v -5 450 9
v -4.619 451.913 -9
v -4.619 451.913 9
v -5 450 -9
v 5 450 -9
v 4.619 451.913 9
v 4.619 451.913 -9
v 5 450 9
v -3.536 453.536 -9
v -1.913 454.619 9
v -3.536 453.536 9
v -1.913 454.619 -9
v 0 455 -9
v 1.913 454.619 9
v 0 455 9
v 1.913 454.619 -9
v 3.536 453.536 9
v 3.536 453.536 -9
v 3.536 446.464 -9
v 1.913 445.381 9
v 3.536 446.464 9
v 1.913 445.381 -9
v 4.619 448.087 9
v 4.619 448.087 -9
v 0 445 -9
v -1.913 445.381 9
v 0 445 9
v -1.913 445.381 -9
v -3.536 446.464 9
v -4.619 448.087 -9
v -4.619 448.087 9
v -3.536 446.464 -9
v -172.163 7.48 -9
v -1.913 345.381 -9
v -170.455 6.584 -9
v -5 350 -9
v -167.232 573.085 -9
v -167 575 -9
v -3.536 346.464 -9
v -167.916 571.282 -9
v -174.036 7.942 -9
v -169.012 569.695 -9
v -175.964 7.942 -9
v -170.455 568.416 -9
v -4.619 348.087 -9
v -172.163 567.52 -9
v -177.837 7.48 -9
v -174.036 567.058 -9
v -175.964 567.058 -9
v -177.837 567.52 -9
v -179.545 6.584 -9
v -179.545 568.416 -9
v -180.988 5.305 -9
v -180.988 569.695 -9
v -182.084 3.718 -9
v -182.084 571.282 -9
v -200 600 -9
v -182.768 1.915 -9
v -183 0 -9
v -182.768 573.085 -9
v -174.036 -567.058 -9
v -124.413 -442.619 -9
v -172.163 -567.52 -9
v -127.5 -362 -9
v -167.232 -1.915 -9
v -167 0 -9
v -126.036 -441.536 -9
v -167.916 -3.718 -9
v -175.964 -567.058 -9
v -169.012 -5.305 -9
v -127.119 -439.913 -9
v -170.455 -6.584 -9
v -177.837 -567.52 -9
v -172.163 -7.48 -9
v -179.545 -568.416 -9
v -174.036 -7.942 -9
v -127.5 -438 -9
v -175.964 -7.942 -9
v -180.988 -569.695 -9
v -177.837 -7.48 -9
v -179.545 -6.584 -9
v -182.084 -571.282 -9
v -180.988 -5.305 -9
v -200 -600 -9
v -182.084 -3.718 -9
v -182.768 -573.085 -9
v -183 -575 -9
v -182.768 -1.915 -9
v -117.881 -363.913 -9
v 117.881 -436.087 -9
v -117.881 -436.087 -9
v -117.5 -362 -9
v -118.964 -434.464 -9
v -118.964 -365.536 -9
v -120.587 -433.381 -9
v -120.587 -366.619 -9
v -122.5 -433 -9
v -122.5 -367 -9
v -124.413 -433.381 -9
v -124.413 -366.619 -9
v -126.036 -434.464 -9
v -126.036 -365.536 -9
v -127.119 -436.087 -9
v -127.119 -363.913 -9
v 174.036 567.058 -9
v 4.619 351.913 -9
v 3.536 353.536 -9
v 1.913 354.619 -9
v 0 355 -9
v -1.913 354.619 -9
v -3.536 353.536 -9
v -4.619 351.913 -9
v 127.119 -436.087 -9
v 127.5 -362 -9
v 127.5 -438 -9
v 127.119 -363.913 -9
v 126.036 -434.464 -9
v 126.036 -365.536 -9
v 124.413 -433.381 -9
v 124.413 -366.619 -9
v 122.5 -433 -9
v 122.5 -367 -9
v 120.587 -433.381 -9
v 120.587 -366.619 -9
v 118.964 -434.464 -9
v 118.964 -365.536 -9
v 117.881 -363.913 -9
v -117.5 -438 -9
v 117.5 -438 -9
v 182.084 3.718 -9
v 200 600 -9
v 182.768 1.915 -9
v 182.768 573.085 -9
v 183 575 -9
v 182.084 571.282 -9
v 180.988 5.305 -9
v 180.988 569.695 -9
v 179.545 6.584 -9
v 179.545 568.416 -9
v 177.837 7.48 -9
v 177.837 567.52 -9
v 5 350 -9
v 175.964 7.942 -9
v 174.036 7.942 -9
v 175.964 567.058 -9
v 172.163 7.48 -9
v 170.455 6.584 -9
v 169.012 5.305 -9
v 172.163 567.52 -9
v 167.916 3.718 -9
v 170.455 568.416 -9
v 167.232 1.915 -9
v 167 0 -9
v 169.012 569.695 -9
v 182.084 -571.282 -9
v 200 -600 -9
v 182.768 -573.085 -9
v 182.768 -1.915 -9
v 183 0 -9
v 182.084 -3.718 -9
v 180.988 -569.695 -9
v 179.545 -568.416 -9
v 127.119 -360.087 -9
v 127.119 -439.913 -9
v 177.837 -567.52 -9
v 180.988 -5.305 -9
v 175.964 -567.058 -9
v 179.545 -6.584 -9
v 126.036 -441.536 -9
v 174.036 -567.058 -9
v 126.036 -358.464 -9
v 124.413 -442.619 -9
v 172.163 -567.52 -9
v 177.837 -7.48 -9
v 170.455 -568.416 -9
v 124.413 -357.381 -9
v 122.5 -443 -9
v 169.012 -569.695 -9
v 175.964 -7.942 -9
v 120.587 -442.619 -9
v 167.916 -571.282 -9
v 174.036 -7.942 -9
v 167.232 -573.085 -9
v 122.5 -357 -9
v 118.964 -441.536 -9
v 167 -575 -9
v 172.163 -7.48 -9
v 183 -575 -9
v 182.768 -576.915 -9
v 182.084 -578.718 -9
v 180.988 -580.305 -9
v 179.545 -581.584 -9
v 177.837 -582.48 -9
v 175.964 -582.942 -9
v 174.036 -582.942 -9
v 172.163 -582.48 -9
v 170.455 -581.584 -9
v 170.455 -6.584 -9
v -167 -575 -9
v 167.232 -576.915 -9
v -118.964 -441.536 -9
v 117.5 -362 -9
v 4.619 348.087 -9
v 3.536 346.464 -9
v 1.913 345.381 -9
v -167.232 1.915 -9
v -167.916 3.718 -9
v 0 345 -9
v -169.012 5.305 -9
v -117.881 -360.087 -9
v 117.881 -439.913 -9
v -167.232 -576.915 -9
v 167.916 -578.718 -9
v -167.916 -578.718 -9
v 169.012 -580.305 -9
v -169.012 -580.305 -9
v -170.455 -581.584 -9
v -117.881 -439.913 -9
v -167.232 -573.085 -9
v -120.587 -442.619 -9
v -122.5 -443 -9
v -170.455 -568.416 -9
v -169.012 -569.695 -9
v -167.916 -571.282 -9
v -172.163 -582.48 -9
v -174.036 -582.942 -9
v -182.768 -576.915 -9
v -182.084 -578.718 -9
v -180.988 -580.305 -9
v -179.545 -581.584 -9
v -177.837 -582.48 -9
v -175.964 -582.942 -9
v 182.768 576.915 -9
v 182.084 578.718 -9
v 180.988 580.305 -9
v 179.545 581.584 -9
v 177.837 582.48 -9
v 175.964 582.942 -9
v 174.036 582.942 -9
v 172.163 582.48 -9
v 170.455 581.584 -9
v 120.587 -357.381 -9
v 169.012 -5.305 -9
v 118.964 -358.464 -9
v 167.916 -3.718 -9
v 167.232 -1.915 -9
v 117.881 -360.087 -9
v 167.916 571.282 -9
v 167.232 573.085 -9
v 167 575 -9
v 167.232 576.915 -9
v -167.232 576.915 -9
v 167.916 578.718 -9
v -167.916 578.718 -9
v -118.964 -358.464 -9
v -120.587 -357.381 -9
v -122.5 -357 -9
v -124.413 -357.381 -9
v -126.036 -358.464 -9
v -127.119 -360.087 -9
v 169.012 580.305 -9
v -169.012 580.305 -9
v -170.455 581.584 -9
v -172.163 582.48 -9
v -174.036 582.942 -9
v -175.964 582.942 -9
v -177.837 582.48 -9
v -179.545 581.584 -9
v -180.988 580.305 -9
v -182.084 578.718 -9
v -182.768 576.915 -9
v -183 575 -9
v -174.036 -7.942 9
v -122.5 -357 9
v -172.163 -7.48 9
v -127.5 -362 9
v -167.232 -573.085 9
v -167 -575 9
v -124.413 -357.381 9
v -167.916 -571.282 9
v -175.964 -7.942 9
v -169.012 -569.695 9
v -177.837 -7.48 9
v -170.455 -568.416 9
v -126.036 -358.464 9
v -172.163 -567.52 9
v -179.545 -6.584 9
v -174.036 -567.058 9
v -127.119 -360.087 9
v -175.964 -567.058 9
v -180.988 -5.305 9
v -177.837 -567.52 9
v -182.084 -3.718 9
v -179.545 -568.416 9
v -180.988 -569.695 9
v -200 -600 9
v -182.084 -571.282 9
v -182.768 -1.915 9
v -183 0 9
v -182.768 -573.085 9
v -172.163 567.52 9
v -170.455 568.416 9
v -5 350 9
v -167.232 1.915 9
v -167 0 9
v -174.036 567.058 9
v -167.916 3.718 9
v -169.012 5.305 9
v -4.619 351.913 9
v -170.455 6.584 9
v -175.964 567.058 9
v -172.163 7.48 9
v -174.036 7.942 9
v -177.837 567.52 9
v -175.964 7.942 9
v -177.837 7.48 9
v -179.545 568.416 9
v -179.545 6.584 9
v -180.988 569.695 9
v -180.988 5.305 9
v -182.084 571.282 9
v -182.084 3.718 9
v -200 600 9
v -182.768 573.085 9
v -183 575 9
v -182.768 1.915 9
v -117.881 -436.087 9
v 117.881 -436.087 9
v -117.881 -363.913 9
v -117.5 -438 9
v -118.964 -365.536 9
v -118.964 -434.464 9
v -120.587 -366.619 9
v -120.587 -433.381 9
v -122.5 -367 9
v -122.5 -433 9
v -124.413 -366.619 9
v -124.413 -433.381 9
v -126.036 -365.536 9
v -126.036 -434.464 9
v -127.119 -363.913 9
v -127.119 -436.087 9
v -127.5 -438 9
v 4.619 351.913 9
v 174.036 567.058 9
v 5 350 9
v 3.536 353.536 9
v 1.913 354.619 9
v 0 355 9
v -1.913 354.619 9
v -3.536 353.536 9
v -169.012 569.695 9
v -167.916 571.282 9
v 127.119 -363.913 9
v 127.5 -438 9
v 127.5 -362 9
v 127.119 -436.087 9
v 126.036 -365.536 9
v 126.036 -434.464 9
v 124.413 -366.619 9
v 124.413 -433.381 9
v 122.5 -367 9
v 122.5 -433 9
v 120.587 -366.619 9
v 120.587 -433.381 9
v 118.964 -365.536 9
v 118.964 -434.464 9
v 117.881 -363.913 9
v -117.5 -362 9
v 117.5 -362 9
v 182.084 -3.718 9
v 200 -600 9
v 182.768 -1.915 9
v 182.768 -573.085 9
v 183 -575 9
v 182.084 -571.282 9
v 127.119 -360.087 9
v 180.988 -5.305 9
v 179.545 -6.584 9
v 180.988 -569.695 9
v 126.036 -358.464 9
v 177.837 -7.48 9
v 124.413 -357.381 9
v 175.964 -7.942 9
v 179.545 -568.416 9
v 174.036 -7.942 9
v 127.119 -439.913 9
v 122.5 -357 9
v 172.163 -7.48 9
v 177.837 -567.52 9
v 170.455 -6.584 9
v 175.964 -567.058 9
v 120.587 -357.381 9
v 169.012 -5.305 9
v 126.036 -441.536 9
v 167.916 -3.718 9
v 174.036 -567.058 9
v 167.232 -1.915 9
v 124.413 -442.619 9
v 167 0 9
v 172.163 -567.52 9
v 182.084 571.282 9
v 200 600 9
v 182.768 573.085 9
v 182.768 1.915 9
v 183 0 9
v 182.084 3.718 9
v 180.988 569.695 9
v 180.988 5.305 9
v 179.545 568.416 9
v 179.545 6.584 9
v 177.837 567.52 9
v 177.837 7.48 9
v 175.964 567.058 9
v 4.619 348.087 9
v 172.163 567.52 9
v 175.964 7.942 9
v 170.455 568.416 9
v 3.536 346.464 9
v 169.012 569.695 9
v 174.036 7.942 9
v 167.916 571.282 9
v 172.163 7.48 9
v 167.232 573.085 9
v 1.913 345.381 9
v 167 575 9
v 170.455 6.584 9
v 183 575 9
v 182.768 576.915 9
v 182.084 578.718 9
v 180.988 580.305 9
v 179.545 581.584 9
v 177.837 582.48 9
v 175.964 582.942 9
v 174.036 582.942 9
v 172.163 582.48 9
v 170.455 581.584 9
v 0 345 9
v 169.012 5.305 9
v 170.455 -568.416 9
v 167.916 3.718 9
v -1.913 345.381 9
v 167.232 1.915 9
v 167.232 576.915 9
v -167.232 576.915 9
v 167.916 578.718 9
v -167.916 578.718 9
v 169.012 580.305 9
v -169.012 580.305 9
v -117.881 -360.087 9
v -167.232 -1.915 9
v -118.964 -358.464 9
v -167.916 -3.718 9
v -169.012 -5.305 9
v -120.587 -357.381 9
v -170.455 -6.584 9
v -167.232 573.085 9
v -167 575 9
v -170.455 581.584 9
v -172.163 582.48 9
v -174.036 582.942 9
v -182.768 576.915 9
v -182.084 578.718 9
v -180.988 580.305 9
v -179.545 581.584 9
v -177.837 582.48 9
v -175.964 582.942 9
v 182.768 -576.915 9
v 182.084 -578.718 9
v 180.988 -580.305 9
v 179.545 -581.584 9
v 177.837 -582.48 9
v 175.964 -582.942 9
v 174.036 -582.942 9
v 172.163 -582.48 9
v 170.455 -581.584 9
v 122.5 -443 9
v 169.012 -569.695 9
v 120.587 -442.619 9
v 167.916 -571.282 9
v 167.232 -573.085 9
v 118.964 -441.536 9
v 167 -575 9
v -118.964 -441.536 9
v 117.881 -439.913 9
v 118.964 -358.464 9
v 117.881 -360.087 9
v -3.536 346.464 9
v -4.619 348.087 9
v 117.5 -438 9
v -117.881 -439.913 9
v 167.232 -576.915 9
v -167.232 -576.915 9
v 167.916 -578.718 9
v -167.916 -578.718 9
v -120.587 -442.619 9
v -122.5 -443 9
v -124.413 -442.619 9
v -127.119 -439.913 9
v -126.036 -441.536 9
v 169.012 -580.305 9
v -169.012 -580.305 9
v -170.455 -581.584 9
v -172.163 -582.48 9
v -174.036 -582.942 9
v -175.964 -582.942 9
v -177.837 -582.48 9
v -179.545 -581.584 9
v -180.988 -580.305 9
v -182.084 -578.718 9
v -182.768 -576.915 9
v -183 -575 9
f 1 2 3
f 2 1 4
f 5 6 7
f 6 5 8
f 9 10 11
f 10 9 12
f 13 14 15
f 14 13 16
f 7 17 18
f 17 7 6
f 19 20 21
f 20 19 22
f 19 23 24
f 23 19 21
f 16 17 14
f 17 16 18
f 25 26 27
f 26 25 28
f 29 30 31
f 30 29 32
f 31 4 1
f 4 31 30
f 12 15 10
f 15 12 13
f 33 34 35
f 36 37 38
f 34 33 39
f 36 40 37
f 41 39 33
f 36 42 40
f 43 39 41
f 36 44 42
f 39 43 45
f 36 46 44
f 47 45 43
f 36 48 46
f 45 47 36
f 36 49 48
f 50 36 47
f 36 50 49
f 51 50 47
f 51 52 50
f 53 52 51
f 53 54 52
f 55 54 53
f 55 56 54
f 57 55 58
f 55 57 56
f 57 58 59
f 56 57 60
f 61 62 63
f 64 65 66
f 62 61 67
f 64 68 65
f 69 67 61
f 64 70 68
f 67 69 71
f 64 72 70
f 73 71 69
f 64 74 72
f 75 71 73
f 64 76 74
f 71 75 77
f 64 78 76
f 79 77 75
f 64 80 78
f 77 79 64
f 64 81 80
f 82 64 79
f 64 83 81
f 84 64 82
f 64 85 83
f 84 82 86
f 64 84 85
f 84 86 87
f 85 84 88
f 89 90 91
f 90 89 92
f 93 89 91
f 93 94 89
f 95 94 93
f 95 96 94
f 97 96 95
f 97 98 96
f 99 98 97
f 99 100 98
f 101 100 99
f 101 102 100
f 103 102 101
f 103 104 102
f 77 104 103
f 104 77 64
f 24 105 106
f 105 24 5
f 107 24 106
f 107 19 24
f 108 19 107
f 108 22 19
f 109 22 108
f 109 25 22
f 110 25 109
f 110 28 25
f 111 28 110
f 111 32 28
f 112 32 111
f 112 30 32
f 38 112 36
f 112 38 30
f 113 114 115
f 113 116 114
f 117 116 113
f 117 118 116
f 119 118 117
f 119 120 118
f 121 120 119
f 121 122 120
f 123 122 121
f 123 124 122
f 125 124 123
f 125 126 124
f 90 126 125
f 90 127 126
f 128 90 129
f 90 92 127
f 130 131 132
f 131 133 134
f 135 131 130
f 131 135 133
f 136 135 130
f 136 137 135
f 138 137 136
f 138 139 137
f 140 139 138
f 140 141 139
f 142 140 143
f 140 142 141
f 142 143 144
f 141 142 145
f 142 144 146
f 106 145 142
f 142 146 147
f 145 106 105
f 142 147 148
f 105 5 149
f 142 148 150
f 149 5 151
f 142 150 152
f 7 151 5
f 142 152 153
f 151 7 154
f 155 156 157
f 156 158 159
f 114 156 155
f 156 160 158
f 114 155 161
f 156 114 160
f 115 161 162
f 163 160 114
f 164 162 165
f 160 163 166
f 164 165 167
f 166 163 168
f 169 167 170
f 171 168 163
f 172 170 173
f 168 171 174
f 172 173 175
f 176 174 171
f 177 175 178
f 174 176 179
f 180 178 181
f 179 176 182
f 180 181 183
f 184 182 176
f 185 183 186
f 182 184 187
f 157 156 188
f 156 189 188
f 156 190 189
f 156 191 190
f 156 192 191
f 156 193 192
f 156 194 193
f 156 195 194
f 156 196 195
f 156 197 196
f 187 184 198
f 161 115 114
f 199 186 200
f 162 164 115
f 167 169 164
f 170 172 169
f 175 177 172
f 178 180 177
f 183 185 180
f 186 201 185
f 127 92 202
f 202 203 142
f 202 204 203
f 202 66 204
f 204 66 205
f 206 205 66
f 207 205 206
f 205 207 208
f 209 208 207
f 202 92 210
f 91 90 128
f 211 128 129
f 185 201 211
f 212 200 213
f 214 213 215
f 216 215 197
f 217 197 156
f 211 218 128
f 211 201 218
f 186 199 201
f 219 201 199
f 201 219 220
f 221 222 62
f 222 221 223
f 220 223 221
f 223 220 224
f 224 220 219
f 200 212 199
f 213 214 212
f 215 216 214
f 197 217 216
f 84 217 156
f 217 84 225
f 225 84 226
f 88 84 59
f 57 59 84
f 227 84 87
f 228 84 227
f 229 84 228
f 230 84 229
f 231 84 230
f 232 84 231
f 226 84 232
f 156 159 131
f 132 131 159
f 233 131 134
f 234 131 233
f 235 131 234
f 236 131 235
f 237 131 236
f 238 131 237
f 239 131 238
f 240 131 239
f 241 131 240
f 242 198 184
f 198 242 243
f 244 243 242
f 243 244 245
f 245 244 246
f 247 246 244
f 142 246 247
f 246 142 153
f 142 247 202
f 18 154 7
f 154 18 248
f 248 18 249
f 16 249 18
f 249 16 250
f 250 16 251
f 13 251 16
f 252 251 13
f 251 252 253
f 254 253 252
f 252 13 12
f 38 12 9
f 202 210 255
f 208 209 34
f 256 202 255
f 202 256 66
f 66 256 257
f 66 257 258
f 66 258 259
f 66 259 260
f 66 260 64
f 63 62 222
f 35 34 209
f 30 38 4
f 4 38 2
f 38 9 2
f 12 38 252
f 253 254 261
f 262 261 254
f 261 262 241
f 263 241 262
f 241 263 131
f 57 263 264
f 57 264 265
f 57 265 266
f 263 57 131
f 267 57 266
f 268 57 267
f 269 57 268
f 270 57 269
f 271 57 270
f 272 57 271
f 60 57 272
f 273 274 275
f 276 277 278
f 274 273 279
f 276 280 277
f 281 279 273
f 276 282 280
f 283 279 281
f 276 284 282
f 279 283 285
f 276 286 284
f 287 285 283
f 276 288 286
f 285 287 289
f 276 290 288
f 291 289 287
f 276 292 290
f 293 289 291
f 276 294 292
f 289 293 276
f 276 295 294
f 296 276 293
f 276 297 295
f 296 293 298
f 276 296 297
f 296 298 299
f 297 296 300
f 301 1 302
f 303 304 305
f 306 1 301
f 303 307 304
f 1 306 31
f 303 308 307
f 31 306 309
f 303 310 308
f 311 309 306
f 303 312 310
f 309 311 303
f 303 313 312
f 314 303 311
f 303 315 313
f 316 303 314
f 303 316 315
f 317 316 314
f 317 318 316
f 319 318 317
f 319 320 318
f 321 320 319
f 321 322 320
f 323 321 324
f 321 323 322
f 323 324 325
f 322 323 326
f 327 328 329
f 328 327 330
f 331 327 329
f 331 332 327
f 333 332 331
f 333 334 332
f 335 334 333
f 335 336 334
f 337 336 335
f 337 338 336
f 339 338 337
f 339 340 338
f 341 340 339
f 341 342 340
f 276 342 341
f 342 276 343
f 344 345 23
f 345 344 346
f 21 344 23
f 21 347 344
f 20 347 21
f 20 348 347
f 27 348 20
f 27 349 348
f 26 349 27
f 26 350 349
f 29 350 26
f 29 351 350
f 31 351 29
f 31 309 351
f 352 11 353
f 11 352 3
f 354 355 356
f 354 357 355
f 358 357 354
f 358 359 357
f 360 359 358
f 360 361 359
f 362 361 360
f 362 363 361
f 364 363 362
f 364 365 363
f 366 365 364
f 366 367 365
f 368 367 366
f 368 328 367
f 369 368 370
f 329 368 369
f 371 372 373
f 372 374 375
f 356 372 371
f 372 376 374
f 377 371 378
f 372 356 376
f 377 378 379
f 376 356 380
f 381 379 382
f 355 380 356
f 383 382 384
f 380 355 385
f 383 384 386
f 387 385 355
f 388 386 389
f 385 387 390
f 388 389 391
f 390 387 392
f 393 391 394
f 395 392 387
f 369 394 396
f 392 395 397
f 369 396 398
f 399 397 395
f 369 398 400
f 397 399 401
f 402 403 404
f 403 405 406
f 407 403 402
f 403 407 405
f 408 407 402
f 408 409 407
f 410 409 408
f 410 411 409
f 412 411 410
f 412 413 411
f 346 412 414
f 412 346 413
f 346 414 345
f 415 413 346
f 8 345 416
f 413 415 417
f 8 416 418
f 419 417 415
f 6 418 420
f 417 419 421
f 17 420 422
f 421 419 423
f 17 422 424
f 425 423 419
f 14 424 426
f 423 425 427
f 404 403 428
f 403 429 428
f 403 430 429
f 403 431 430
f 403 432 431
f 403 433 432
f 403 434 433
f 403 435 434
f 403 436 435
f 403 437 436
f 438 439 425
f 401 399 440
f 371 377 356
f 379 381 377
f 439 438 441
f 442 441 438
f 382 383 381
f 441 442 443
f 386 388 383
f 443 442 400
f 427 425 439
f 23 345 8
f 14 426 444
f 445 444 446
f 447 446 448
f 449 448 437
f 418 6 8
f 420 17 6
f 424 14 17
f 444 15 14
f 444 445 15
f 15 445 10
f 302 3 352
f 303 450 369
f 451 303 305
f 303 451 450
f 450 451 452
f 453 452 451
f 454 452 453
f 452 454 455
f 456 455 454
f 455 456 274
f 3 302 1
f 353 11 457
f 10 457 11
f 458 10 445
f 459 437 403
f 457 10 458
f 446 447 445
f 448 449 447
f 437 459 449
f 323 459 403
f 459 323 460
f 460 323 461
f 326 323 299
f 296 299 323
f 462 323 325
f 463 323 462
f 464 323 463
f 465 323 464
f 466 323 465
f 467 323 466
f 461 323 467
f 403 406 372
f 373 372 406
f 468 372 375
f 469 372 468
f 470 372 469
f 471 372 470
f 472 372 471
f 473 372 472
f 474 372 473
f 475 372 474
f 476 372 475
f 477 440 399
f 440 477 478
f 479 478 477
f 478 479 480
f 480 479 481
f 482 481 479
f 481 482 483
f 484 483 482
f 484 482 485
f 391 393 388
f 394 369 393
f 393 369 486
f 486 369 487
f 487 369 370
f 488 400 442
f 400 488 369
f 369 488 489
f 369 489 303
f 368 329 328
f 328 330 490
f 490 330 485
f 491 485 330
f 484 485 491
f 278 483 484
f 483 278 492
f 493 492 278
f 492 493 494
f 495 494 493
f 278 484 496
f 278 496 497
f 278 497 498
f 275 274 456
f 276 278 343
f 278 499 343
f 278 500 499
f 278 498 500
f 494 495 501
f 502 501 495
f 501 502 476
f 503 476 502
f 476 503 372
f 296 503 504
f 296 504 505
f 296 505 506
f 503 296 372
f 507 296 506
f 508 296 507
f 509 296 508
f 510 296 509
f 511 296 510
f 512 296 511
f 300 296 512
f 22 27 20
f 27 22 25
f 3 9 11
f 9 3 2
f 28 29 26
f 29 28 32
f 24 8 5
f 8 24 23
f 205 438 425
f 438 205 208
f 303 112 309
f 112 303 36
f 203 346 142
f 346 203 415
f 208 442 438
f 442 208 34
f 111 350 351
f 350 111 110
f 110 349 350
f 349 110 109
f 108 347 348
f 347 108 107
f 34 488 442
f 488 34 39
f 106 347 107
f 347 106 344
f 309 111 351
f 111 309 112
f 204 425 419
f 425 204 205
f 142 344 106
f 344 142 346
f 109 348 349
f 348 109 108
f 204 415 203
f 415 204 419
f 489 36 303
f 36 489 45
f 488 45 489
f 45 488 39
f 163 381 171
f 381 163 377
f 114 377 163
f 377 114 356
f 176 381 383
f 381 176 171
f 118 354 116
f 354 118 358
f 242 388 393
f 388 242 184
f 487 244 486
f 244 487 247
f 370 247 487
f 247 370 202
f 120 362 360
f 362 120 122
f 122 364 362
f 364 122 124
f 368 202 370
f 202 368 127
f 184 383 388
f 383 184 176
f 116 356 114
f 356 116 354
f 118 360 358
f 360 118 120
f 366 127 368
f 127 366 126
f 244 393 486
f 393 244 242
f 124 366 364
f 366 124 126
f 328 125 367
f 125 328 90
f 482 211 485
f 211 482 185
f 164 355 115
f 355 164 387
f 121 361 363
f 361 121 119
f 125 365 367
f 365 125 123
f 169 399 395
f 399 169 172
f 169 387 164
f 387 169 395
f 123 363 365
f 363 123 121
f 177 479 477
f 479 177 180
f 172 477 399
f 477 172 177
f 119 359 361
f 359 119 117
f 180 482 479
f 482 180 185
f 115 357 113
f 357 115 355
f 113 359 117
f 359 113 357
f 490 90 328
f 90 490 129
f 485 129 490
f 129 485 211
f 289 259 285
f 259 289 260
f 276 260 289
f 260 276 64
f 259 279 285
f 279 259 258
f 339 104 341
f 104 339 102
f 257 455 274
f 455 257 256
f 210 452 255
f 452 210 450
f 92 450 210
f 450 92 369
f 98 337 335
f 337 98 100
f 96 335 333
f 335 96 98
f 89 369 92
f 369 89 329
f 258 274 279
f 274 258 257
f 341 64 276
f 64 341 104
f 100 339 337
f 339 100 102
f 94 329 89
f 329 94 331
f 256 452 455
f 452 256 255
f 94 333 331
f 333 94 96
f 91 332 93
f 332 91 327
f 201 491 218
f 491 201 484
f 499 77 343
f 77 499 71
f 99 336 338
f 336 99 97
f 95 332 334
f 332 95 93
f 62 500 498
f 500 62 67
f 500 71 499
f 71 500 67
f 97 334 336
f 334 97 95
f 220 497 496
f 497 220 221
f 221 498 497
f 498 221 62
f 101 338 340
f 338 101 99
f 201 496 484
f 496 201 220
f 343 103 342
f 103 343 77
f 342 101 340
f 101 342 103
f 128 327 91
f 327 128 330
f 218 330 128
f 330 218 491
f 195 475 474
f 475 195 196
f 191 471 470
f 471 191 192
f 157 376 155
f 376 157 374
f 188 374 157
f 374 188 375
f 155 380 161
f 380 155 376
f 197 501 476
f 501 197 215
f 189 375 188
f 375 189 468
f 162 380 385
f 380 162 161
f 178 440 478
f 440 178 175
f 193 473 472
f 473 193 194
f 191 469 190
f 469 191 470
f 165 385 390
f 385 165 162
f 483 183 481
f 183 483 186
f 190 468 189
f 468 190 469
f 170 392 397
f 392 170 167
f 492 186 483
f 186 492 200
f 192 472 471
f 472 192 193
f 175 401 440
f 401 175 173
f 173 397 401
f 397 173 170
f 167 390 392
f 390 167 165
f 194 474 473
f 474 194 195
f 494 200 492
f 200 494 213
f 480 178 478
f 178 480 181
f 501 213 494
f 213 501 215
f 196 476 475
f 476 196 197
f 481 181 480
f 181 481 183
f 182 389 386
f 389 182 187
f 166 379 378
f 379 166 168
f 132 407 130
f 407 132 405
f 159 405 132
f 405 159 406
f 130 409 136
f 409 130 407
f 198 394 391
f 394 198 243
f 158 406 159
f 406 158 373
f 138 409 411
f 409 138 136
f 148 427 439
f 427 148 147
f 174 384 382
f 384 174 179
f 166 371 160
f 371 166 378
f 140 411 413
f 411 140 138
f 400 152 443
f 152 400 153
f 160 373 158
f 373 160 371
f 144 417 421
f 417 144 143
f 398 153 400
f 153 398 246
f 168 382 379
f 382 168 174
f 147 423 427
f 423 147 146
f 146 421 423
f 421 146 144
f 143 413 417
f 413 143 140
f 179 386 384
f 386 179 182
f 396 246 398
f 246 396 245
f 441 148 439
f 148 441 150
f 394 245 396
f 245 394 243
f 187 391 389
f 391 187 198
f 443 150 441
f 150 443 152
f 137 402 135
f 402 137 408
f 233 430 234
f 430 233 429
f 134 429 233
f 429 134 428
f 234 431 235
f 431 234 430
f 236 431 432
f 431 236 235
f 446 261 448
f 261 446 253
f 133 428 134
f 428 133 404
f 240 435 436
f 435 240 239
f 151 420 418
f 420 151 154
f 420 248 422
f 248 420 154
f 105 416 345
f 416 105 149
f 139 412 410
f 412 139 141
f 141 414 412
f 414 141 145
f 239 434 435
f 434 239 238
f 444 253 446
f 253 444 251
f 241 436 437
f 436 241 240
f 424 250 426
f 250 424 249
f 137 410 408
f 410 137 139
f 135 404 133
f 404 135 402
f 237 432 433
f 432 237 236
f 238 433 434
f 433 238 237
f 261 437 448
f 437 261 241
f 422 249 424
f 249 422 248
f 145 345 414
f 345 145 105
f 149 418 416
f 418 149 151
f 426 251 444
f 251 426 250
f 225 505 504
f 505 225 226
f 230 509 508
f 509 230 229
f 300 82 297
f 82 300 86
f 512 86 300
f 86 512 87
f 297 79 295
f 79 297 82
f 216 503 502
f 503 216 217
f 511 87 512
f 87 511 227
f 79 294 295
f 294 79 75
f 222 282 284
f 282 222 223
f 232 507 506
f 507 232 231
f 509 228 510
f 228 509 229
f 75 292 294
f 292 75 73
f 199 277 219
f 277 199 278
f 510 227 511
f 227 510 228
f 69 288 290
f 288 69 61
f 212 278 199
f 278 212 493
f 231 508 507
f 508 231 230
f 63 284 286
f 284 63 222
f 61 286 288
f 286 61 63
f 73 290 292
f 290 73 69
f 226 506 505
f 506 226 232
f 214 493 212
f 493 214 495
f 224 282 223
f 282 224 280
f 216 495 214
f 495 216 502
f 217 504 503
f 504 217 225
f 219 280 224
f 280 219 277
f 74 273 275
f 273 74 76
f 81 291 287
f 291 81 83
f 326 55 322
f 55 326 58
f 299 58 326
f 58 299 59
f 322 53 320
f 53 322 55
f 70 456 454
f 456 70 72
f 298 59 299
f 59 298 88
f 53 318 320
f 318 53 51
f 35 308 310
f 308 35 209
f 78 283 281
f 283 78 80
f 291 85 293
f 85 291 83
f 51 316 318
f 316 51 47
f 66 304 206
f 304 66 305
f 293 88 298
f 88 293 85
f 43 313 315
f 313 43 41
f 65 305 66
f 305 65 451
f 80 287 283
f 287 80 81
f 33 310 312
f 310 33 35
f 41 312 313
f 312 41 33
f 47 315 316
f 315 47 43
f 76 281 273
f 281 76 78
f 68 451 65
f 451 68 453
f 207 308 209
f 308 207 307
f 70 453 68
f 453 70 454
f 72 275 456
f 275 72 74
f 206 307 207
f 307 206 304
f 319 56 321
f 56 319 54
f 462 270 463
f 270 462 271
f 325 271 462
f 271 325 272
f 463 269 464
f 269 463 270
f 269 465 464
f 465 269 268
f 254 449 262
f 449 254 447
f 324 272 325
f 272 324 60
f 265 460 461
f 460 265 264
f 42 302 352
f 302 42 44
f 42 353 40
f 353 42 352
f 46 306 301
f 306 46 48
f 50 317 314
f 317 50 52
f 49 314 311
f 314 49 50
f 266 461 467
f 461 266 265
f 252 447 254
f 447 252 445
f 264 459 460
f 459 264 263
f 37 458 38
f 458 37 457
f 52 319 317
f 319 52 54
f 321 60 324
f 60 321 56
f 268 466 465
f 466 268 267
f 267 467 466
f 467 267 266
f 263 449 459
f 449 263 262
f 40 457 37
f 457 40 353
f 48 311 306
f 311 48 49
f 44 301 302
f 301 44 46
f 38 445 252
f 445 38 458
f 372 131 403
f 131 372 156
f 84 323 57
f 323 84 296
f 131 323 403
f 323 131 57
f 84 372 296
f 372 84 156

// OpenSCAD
// file: ../fixings/tube_clamp_square_base_plate_132_functions.scad
function get_L_shaft_with_base_plate_square_base_plate_132(beam_width) = 
    // (beam_width == 40) ?
    75
;
function get_R_plate_square_base_plate_132(beam_width) = 
    // (beam_width == 40) ?
    [143, 75, 18.5]
;
function get_thickness_square_base_plate_132(beam_width) = 
    // (beam_width == 40) ?
    8
;
function get_offset_hole_x_square_base_plate_132(beam_width) = 
    // (beam_width == 40) ?
    100 / 2
;
function get_diameter_hole_square_base_plate_132(beam_width) = 
    // (beam_width == 40) ?
    10
;
// file: ../fixings/tube_clamp_round_base_plate_132_functions.scad
function get_L_shaft_with_base_plate_round_base_plate_132(tube_diameter) = 
    (tube_diameter == 27) ? 
        85
    : (tube_diameter == 42) ?
        122
    : 25
;
function get_R_plate_round_base_plate_132(tube_diameter) = 
    (tube_diameter == 27) ? 
        [64, 114, 7]
    : (tube_diameter == 42) ?
        [80, 140, 10]
    : [10, 20, 1]
;
function get_offset_hole_y_round_base_plate_132(tube_diameter) = 
    (tube_diameter == 27) ? 
        38
    : (tube_diameter == 42) ?
        50
    : 10
;
function get_diameter_hole_round_base_plate_132(tube_diameter) = 10;
// file: ../fixings/tube_clamp_round_3_way_through_116_functions.scad
function  get_L_shaft_long_round_3_way_through_116(tube_diameter) = 
    (tube_diameter == 27) ? 
        42
    : (tube_diameter == 42) ?
        60
    : 25
;
function get_thickness_round_3_way_through_116(tube_diameter) = 7;
function get_L_shaft_short_round_3_way_through_116(tube_diameter) = tube_diameter + 2 * get_thickness_round_3_way_through_116();
// file: ../fixings/tube_clamp_round_tee_long_104_functions.scad
// include <../../config.scad>;

function get_L_shaft_long_round_tee_long_104(tube_diameter) = 
    (tube_diameter == 27) ? 
        85
    : (tube_diameter == 42) ?
        122
    : 25
;
function get_L_shaft_short_round_tee_long_104(tube_diameter) = 
    (tube_diameter == 27) ? 
        42
    : (tube_diameter == 42) ?
        61
    : 10
;
// file: ../brake/brake_assembly_functions.scad
// include <../../config.scad>; // circular reference!

function get_y_pos_lead_fixing_ballscrew_to_brake_arms(angle_brake_rod, y_pos_axle_rear, x_pos_axle_leg_rear, x_offset_fixing_brake_arm_to_lead_plate) = y_pos_axle_rear + (x_pos_axle_leg_rear - x_offset_fixing_brake_arm_to_lead_plate) / tan(angle_brake_rod); // (X_POS_AXLE_LEG_REAR - X_OFFSET_FIXING_BRAKE_ARM_TO_LEAD_PLATE)
// file: ../common/metric_bolt_functions.scad
function get_metric_bolt_head_height(size) = size;
function get_metric_bolt_head_diameter(size) = size * 2;
function get_metric_bolt_washer_diameter_safe_working_clearance(size) = 
    (size < 20) ?
        4 * size
    :
        3 * size
;
// file: ../fixings/tube_clamp_round_base_plate_132.scad
include <../../config.scad>;
use <./tube_clamp_round_base_plate_132_functions.scad>;

module tube_clamp_round_base_plate_132(tube_diameter) {
    L_shaft_with_base_plate = get_L_shaft_with_base_plate_round_base_plate_132(tube_diameter);
    R_plate = get_R_plate_round_base_plate_132(tube_diameter);
    t = R_plate[2];
    offset_hole_y = get_offset_hole_y_round_base_plate_132(tube_diameter);
    d_hole_bolt_round_base_plate_132 = get_diameter_hole_round_base_plate_132(tube_diameter);
    color("LightGrey") union() {
        // cylinder section
        translate([0, 0, L_shaft_with_base_plate / 2]) difference() {
            cylinder(L_shaft_with_base_plate, tube_diameter / 2 + t, tube_diameter / 2 + t, center = true);
            cylinder(L_shaft_with_base_plate, tube_diameter / 2, tube_diameter / 2, center = true);
        }
        // base plate
        translate([0, 0, R_plate[2] / 2]) difference() {
            cube(R_plate, center = true);
            translate([0, offset_hole_y, 0]) cylinder(R_plate[2], d_hole_bolt_round_base_plate_132 / 2, d_hole_bolt_round_base_plate_132 / 2, center = true);
            translate([0, -offset_hole_y, 0]) cylinder(R_plate[2], d_hole_bolt_round_base_plate_132 / 2, d_hole_bolt_round_base_plate_132 / 2, center = true);
        }
    }
    // Shopping
    echo("Round base plate 132: Tube clamp - x1");
}

// test output
tube_clamp_round_base_plate_132(27);
translate([200, 0, 0]) tube_clamp_round_base_plate_132(42);
// main file
include <../../config.scad>;
use <../fixings/tube_clamp_round_base_plate_132.scad>;

module bed() {
    offset_hole_y_front = get_offset_hole_y_round_base_plate_132(D_AXLE_FRONT);
    d_hole_front = get_diameter_hole_round_base_plate_132(D_AXLE_FRONT);
    offset_hole_y_rear = get_offset_hole_y_round_base_plate_132(D_AXLE_REAR);
    d_hole_rear = get_diameter_hole_round_base_plate_132(D_AXLE_REAR);
    count_shafts_y = 3;
    color("burlywood") difference() {
        cube(R_BED, center = true);
        // front axle leg holes
        translate([0, Y_POS_AXLE_FRONT, 0]) for (index_side_y = [0 : 1 : 1]) {
            mirror([0, index_side_y, 0]) {
                translate([0, offset_hole_y_front, 0]) cylinder(R_BED[2], d_hole_front / 2, d_hole_front / 2, center = true);
            }
        }
        // rear axle leg holes
        translate([0, Y_POS_AXLE_REAR, 0]) for (index_side_x = [0 : 1 : 1]) {
            mirror([index_side_x, 0, 0]) {
                translate([X_POS_AXLE_LEG_REAR, 0, 0]) for (index_side_y = [0 : 1 : 1]) {
                    mirror([0, index_side_y, 0]) {
                        translate([0, offset_hole_y_rear, 0]) cylinder(R_BED[2], d_hole_rear / 2, d_hole_rear / 2, center = true);
                    }
                }
            }
        }
        // top crate perimeter shaft holes
        for (index_side_x = [0 : 1 : 1]) {
            mirror([index_side_x, 0, 0]) {
                translate([R_BED[0] / 2 - D_WASHER_SHAFT_TOP_CRATE / 2, 0, 0]) for (index_shaft_y = [0 : 1 : count_shafts_y]) {
                    translate([0, -R_BED[1] / 2 + D_WASHER_SHAFT_TOP_CRATE / 2 + index_shaft_y * (R_BED[1] - D_WASHER_SHAFT_TOP_CRATE) / (count_shafts_y - 1), 0]) cylinder(R_BED[2], D_SHAFT_TOP_CRATE / 2, D_SHAFT_TOP_CRATE / 2, center = true);
                }
            }
        }
    }
    // Shopping
    echo(str("Bed: MDF board ", R_BED[1], "mm x ", R_BED[0], "mm x ", R_BED[2], "mm - x1"));
}

bed();
